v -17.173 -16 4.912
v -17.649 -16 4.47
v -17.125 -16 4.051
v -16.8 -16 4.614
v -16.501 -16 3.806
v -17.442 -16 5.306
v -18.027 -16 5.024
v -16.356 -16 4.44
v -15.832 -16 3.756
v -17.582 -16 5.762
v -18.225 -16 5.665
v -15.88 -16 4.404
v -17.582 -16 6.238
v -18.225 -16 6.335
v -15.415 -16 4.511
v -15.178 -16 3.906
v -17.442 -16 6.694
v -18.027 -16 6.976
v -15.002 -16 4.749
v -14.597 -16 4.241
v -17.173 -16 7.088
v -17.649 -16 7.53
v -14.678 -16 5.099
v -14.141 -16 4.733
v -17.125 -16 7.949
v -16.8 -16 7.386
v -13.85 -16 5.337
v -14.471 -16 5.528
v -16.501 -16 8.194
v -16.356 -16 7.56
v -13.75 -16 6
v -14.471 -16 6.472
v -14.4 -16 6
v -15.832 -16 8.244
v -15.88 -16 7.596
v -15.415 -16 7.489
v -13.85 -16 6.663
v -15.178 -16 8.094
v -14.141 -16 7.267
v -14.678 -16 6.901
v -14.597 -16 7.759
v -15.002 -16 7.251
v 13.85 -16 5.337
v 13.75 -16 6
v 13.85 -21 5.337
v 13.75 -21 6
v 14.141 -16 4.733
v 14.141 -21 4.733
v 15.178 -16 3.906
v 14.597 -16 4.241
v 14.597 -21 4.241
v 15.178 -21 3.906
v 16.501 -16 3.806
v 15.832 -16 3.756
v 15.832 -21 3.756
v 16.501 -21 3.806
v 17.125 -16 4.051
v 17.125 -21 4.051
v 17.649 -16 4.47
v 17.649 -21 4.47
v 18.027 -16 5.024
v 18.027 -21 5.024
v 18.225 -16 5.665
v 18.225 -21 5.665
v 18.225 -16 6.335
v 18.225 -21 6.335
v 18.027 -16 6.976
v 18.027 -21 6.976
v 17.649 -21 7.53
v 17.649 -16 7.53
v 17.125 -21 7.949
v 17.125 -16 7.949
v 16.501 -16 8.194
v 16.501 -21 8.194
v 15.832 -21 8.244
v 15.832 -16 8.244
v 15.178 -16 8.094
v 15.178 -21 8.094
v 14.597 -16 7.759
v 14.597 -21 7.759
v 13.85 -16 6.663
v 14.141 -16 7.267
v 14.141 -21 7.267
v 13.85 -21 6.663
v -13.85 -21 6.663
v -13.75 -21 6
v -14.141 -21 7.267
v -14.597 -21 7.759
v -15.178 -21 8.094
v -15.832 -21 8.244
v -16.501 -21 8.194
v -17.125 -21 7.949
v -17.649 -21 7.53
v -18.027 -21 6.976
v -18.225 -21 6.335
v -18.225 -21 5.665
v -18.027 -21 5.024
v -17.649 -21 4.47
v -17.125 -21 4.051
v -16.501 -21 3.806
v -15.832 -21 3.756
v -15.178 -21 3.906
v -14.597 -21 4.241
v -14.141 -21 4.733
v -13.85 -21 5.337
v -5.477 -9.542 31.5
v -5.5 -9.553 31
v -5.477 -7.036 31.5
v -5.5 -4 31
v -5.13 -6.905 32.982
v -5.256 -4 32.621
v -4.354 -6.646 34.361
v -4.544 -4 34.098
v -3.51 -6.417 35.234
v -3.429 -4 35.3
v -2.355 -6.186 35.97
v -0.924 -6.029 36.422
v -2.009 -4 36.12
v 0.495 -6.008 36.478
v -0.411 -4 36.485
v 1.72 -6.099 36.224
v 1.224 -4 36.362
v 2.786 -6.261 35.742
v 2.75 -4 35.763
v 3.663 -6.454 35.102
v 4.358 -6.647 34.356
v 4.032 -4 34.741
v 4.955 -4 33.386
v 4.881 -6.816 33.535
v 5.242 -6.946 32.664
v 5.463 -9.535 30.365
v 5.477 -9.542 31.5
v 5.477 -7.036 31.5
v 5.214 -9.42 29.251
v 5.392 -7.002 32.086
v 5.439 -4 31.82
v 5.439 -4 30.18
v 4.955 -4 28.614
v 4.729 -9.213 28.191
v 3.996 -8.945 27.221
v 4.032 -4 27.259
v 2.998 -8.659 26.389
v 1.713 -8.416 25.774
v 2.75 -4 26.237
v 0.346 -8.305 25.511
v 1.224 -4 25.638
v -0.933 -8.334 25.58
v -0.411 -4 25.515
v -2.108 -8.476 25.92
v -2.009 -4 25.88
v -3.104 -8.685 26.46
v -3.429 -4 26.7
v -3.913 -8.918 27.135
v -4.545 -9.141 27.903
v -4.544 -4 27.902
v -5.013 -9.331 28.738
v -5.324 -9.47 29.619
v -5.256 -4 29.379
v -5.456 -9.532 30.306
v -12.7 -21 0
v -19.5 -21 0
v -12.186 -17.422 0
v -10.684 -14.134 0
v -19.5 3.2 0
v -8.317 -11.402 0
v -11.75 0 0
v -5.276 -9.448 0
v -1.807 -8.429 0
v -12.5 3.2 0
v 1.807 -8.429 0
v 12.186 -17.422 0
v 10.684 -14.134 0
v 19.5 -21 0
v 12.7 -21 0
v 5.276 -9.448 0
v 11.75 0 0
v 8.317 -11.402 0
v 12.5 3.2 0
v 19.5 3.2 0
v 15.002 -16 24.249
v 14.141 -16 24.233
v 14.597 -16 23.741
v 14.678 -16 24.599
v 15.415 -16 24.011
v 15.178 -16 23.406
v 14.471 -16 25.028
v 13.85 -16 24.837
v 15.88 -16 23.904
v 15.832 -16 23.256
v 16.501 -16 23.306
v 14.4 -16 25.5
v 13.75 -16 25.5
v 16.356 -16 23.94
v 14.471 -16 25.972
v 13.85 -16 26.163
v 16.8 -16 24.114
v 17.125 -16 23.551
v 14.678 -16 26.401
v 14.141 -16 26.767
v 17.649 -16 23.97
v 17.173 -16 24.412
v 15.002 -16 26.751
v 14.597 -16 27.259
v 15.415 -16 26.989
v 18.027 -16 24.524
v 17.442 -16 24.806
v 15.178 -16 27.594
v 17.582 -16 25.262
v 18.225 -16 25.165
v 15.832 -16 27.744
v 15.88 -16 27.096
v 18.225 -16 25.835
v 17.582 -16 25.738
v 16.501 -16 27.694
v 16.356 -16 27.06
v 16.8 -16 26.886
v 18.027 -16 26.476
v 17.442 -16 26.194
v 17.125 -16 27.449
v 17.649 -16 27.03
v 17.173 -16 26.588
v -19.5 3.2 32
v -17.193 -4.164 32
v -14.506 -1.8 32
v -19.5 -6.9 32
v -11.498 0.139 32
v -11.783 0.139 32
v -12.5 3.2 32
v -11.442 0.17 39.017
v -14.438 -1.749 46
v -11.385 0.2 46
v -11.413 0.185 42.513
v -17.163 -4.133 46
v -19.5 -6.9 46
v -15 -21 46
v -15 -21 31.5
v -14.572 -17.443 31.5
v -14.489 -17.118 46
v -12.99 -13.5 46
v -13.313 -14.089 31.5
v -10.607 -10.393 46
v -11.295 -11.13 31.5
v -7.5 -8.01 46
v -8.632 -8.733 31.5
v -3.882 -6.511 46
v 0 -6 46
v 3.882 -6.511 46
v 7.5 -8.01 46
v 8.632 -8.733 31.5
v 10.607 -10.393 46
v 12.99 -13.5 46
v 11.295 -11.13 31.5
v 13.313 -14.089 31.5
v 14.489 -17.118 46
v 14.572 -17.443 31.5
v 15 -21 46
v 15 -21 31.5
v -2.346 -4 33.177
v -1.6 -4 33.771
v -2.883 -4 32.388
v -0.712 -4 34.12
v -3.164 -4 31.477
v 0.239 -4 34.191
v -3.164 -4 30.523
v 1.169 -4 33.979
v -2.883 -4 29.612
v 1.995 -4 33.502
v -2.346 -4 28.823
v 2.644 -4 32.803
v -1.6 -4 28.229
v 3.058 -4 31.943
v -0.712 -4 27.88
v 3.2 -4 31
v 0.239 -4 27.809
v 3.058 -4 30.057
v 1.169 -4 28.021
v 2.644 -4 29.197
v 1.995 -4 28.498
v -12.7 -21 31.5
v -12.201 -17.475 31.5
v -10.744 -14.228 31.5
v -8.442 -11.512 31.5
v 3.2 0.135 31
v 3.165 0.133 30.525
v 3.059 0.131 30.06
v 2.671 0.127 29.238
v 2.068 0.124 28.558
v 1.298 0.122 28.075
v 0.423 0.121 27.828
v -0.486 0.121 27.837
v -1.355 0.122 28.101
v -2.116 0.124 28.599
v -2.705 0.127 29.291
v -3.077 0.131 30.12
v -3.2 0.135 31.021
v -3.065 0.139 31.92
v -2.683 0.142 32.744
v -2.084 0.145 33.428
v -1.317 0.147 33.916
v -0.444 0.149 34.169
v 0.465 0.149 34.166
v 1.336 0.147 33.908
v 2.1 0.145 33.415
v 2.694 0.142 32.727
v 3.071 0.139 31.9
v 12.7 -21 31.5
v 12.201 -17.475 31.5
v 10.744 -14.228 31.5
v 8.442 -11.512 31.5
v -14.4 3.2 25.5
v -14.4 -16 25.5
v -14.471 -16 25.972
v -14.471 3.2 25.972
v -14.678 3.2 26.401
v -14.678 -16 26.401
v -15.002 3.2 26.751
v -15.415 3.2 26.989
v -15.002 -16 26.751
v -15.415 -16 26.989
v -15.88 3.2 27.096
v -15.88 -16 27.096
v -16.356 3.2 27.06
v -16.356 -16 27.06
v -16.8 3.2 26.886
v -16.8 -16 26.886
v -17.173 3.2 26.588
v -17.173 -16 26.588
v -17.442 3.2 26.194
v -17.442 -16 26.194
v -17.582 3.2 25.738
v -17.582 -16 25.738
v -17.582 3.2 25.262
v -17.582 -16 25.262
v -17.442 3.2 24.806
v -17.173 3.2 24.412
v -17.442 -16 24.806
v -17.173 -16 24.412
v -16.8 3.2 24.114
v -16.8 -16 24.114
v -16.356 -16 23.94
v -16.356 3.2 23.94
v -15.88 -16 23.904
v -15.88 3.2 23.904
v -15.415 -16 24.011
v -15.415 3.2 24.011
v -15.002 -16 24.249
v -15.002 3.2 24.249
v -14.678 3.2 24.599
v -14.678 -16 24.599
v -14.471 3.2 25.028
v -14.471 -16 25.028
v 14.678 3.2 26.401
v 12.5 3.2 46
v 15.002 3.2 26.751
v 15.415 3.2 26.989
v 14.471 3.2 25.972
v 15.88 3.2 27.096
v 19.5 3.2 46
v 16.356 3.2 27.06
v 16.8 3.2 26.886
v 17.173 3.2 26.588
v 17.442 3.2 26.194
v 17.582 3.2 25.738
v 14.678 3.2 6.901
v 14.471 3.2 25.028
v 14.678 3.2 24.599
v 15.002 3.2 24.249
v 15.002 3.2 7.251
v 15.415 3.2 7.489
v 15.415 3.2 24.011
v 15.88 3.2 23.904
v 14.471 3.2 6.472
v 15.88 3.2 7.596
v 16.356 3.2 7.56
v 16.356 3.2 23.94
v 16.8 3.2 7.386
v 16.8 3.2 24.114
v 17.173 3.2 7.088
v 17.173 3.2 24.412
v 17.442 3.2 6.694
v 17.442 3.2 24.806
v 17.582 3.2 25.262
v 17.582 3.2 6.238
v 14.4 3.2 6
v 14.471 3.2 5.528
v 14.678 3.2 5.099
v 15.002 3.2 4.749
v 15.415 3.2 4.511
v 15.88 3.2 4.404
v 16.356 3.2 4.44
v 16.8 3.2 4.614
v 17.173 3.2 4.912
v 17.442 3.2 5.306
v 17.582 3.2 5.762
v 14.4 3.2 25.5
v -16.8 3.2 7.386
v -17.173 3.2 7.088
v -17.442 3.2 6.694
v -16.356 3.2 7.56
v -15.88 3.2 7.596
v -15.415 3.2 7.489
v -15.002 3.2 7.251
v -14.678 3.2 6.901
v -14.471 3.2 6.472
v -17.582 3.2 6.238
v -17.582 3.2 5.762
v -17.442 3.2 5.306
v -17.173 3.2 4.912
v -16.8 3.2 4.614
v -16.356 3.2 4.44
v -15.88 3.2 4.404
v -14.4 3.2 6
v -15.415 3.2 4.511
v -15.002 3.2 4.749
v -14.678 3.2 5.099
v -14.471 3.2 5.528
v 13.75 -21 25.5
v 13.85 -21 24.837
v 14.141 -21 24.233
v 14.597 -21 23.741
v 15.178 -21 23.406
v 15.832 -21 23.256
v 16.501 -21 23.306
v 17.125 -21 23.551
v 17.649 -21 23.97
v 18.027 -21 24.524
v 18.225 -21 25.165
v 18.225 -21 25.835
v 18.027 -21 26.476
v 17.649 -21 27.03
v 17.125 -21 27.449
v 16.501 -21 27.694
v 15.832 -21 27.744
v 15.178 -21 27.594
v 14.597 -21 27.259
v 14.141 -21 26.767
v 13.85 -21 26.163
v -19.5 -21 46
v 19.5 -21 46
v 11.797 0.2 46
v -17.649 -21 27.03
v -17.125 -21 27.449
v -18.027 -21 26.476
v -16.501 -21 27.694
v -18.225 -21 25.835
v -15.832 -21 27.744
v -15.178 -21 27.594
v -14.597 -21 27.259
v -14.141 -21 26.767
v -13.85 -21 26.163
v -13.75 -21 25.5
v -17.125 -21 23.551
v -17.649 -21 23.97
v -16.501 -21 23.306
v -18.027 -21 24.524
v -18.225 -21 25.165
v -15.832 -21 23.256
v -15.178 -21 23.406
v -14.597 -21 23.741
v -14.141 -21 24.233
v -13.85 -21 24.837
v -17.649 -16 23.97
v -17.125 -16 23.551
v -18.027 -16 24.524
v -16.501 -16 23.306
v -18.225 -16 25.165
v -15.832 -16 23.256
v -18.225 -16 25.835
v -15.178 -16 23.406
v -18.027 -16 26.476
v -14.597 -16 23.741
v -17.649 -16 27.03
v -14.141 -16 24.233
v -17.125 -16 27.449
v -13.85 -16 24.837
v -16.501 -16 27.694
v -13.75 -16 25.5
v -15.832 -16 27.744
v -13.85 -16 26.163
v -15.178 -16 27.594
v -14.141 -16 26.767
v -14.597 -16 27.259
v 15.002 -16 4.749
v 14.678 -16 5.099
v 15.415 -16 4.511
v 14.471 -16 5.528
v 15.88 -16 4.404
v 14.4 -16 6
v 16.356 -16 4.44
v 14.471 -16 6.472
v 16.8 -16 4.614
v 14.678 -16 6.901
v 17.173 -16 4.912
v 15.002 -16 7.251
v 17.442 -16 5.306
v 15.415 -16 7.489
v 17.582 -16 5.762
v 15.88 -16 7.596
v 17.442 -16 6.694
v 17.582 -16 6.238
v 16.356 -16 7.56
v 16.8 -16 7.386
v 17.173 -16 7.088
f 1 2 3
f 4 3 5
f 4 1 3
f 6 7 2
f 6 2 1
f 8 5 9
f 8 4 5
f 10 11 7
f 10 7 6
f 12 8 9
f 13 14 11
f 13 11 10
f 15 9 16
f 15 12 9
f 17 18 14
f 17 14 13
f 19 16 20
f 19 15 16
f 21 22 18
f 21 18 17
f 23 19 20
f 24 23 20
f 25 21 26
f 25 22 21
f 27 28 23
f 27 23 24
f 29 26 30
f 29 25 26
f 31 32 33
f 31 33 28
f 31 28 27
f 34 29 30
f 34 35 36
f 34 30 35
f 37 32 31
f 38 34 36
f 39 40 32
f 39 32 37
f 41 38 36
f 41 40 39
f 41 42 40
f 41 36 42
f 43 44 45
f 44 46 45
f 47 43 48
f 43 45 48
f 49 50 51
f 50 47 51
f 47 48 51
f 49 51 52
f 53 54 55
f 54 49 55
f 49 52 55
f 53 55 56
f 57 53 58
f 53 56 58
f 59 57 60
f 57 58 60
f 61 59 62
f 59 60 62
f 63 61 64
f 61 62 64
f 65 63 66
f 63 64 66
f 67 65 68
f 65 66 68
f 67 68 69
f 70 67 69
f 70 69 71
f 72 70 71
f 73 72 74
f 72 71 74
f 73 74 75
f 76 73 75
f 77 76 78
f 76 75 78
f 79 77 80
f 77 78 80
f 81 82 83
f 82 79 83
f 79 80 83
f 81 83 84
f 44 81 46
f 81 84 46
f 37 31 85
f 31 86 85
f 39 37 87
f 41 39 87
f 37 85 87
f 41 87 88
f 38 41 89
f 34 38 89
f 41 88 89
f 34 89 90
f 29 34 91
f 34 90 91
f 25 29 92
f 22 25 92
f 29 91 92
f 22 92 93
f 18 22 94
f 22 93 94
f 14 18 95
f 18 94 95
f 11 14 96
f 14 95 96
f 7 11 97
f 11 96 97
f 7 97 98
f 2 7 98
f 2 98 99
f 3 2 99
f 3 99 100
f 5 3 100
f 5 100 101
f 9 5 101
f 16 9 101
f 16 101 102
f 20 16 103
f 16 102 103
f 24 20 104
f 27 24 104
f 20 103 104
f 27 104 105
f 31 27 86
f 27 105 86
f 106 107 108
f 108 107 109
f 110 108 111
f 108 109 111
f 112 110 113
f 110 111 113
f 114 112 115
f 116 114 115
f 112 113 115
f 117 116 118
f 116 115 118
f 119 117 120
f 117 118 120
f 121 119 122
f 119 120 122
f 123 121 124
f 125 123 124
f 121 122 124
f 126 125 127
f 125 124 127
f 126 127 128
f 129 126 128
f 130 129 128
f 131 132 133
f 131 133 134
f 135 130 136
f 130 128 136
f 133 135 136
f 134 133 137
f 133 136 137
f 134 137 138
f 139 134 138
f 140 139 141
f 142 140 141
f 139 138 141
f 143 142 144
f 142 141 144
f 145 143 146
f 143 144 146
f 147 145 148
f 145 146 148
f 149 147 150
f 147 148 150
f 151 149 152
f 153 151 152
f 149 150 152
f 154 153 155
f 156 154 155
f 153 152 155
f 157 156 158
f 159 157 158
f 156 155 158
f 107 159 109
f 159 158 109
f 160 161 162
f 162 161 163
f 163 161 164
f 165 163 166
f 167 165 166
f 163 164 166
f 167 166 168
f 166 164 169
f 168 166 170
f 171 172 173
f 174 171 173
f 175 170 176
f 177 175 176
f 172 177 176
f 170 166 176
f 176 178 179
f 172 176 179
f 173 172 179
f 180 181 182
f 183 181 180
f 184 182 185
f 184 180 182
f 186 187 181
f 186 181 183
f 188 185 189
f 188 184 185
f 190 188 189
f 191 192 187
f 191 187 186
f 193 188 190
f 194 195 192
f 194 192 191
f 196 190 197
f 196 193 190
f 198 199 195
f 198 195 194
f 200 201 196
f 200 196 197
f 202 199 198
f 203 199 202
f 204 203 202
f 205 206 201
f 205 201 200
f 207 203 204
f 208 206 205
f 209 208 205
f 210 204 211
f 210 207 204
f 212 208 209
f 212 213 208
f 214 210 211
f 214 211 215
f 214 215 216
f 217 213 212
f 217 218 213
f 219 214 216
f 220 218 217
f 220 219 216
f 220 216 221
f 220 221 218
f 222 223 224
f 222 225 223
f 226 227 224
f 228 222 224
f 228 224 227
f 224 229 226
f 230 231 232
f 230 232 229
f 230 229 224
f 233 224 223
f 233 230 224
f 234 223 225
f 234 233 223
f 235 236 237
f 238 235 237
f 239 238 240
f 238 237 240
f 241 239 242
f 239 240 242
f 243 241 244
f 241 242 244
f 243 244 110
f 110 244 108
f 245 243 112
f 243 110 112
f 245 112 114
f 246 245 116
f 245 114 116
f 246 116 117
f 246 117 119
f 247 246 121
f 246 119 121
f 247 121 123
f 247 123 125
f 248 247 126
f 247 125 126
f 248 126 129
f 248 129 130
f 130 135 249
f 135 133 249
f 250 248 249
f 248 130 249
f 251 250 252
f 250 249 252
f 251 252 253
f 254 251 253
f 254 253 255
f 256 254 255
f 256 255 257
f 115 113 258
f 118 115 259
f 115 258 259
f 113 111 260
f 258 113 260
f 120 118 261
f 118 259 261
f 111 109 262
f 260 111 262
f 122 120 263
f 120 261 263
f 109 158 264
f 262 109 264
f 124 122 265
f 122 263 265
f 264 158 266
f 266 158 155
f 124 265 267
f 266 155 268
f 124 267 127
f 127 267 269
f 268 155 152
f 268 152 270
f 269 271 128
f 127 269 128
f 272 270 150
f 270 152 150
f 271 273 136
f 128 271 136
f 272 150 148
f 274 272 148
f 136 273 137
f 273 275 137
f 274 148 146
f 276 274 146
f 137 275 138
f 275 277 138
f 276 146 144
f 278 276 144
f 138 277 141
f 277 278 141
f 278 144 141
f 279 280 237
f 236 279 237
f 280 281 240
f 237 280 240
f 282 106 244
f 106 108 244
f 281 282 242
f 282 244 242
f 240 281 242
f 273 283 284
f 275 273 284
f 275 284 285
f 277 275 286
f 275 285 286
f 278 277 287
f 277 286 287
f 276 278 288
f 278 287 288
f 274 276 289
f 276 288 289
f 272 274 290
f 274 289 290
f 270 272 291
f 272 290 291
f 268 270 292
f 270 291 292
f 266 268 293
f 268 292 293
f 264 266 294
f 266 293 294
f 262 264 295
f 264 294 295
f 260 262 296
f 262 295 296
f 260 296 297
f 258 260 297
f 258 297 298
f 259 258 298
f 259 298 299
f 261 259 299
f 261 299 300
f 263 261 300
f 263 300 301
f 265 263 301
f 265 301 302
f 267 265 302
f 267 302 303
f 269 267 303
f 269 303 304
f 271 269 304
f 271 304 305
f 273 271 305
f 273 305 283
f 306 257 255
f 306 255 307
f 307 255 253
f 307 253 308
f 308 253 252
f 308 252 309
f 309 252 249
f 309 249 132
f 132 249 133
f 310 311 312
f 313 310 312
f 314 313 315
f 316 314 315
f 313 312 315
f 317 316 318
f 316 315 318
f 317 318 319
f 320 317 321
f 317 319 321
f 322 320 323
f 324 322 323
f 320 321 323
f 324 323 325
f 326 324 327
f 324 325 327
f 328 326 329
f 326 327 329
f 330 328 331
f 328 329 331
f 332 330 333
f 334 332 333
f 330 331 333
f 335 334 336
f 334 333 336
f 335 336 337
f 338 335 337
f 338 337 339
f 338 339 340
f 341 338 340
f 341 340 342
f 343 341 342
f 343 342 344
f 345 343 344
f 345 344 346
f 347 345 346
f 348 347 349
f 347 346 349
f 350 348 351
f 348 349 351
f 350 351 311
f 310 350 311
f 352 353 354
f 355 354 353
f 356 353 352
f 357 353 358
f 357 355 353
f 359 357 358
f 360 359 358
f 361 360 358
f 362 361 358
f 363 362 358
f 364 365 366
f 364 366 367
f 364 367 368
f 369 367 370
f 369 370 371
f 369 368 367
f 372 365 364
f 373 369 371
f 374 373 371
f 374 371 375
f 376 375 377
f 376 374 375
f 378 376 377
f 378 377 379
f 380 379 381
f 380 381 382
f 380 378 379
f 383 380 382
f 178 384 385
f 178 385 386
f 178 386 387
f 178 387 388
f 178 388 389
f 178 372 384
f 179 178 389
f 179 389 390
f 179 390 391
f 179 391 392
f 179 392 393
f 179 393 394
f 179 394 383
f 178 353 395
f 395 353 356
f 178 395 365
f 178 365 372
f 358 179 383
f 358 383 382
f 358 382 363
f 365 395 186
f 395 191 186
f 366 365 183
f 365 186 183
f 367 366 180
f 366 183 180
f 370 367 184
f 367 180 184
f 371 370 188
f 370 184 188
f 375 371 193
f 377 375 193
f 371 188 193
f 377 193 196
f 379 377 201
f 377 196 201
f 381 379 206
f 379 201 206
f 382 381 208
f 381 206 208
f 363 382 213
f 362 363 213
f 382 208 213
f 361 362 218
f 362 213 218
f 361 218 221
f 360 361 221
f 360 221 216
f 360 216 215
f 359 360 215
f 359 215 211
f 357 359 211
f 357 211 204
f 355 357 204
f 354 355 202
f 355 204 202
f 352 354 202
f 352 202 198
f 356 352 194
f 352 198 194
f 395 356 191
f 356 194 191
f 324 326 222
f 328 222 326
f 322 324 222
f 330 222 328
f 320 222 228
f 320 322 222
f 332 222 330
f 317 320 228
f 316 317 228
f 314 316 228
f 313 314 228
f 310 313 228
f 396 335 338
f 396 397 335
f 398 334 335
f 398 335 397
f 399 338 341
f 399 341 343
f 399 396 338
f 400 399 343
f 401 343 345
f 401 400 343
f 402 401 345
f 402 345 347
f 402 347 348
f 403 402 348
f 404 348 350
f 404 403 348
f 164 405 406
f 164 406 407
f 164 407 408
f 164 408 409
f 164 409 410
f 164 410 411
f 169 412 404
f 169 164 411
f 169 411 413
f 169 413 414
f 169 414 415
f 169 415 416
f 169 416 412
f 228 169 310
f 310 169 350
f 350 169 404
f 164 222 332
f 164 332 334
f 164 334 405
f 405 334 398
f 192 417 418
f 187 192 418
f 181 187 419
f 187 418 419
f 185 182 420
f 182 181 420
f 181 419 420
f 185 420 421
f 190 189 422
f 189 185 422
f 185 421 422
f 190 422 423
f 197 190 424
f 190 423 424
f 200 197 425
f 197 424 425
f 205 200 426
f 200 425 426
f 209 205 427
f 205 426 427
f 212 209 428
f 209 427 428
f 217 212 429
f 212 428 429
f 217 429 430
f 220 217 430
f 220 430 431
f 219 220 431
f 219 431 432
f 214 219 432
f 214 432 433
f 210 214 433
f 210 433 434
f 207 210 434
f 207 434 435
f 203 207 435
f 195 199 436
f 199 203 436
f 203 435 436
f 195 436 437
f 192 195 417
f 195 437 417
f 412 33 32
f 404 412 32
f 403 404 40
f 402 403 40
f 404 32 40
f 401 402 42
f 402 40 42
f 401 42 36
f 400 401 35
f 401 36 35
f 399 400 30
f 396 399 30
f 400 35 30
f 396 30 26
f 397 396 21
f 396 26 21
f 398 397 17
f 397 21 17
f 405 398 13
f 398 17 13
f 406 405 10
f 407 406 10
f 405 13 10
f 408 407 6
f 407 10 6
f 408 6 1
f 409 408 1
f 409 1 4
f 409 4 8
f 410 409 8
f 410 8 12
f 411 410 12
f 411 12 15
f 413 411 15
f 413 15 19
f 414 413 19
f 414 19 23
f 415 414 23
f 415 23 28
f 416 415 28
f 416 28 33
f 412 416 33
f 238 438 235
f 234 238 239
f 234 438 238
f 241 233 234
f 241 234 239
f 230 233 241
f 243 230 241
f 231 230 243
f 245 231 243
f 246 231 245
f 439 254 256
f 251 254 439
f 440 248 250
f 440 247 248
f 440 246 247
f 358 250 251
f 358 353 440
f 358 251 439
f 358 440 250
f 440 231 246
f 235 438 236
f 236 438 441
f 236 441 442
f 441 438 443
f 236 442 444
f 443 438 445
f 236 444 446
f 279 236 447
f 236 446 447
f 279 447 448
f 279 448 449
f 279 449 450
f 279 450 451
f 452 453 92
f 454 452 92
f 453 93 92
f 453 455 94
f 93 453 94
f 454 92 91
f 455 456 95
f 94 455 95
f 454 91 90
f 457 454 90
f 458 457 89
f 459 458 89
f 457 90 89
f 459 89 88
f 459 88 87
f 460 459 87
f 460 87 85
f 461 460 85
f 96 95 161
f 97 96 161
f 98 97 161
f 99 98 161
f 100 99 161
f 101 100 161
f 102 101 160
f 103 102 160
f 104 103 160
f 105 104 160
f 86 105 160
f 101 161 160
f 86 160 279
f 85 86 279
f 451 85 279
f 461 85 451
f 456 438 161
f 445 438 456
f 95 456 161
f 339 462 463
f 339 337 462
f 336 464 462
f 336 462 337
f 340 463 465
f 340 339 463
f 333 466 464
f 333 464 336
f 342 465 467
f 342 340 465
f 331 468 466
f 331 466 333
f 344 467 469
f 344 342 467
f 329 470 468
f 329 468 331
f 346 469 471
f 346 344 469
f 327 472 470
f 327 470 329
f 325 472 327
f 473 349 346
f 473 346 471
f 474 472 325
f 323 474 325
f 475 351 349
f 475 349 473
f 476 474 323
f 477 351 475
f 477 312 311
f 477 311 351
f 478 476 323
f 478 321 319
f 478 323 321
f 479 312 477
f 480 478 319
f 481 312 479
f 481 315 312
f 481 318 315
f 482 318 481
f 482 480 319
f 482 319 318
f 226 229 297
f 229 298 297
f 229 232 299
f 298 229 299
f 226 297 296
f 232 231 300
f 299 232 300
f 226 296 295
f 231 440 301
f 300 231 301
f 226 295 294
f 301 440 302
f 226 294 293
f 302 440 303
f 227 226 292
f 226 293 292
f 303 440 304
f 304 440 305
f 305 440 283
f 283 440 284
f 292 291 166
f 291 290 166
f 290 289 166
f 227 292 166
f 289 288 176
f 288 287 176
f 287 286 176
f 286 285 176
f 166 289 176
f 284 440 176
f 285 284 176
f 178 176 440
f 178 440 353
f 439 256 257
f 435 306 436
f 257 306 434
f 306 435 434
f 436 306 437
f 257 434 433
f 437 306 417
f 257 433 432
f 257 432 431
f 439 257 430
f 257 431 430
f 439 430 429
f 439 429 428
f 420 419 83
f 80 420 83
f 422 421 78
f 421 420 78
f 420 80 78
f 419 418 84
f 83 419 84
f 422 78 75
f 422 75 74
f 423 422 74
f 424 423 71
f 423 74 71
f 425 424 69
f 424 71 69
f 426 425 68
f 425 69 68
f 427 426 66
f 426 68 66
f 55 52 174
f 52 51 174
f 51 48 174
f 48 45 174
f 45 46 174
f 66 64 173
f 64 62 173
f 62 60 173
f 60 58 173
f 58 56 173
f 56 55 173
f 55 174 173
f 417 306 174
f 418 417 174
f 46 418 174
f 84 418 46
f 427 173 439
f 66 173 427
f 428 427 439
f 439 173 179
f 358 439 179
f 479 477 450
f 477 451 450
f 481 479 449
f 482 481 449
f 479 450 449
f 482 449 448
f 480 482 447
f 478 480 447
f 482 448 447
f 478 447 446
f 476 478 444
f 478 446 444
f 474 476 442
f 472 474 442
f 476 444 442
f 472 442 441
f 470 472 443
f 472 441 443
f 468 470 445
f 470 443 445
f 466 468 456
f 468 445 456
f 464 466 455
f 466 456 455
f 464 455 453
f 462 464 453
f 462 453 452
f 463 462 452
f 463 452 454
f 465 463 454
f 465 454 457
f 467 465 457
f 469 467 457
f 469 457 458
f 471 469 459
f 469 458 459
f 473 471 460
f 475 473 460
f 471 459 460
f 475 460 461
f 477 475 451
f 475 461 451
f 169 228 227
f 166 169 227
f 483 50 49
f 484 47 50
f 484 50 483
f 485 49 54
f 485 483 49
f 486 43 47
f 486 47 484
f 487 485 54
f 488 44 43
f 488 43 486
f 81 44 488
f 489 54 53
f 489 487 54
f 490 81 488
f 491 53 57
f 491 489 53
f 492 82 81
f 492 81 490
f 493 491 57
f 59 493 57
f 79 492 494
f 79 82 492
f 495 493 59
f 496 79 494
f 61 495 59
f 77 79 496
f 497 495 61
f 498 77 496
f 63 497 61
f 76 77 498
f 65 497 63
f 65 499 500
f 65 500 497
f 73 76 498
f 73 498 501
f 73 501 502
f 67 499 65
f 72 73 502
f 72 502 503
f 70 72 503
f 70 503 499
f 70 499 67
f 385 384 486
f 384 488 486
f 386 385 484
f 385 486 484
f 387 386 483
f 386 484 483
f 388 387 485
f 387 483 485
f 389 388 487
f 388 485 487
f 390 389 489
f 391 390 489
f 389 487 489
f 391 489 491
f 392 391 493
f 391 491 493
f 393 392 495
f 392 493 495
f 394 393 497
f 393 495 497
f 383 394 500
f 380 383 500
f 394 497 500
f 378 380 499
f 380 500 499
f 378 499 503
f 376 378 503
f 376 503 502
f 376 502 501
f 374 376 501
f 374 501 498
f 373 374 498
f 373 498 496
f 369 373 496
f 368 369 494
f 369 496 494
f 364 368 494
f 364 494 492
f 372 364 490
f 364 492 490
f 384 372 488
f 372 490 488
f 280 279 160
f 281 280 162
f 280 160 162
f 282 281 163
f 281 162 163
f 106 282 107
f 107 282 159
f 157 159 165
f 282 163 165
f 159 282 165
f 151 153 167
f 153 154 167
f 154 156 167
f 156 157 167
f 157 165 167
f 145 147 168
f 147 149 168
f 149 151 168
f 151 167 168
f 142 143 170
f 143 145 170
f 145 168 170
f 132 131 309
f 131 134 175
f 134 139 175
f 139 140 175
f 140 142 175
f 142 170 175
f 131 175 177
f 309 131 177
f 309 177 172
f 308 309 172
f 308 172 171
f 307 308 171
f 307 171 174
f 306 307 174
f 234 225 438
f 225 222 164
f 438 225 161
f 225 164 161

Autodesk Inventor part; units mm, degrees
ref_plane "YZ Plane" through (0, 0, 0) normal (1, 0, 0) x (0, 1, 0)
ref_plane "XZ Plane" through (0, 0, 0) normal (0, 1, 0) x (-1, 0, 0)
ref_plane "XY Plane" through (0, 0, 0) normal (0, 0, 1) x (1, 0, 0)
sketch "スケッチ1" plane through (0, 0, 0) normal (0, 0, 1) x (1, 0, 0)
  line L0 (-12.5, 3.2) -> (-11.75, 0)
  line L1 (-11.75, 0) -> (11.75, 0)
  line L2 (11.75, 0) -> (12.5, 3.2)
  line L3 (12.5, 3.2) -> (19.5, 3.2)
  line L4 (19.5, 3.2) -> (19.5, -4)
  line L5 (19.5, -4) -> (-19.5, -4)
  line L6 (-19.5, -4) -> (-19.5, 3.2)
  line L7 (-19.5, 3.2) -> (-12.5, 3.2)
  circle A0 centre (0, -21) radius 12.7 construction
  line L8 (-5.5, -4) -> (5.5, -4) construction
  line L9 (5.5, -4) -> (5.5, -7.5) construction
  line L10 (5.5, -7.5) -> (-5.5, -7.5) construction
  line L11 (-5.5, -7.5) -> (-5.5, -4) construction
  circle A1 centre (0, -21) radius 14.7 construction
  line L12 (-19.5, -21) -> (19.5, -21) construction
  line L13 (-18.75, -24.8) -> (-13.25, -24.8) construction
  line L14 (-13.25, -24.8) -> (-13.25, -27.8) construction
  line L15 (-13.25, -27.8) -> (-18.75, -27.8) construction
  line L16 (-18.75, -27.8) -> (-18.75, -24.8) construction
  line L17 (-16, -27.8) -> (-16, -14.8) construction
  line L18 (-18.75, -14.8) -> (-13.25, -14.8) construction
  line L19 (-13.25, -14.8) -> (-13.25, -17.2) construction
  line L20 (-13.25, -17.2) -> (-18.75, -17.2) construction
  line L21 (-18.75, -17.2) -> (-18.75, -14.8) construction
  line L22 (-14.5, -14.8) -> (-14.5, -27.8) construction
  line L23 (-17.5, -14.8) -> (-17.5, -27.8) construction
  point P0 (0, 0)
  point P1 (0, 0)
  point P2 (0, -4)
  dimension "d0" = 4
  dimension "d1" = 3.2
  dimension "d2" = 23.5
  dimension "d3" = 25
  dimension "d4" = 39
  dimension "d5" = 25.4
  dimension "d6" = 3.5
  dimension "d7" = 21
  dimension "d8" = 11
  dimension "d9" = 2
  dimension "d11" = 5.5
  dimension "d12" = 3
  dimension "d13" = 5.5
  dimension "d14" = 2.4
  dimension "d15" = 10
  dimension "d16" = 1.5
  dimension "d17" = 1.5
  dimension "d18" = 3.8
  dimension "d19" = 16
extrude "押し出し1" add sketch "スケッチ1" along normal blind 46
sketch "スケッチ2" plane through (0, 0, 0) normal (0, 0, -1) x (-1, 0, 0)
  line L0 (19.5, -4) -> (-19.5, -4) projected
  circle A0 centre (0, -21) radius 12.7 projected
  line L1 (19.5, -21) -> (-19.5, -21) projected
  line L2 (-19.5, -21) -> (-19.5, -4)
  line L3 (19.5, -4) -> (19.5, -21)
  point P0 (0, 0)
  point P1 (-12.7, -21)
  point P2 (12.7, -21)
extrude "押し出し2" add sketch "スケッチ2" against normal blind 31.5 contours L3 L1 A0 L2 L0
sketch "スケッチ3" plane through (0, 0, 31.5) normal (0, 0, 1) x (1, 0, 0)
  line L0 (-19.5, -4) -> (19.5, -4) projected
  line L1 (-19.5, -4) -> (-19.5, -21) projected
  line L2 (-19.5, -21) -> (-12.7, -21) projected
  arc A0 (12.7, -21) -> (-12.7, -21) centre (0, -21) ccw projected
  line L3 (12.7, -21) -> (19.5, -21) projected
  line L4 (19.5, -21) -> (19.5, -4) projected
  circle A1 centre (0, -21) radius 15
  point P0 (0, 0)
  point P1 (-15, -21)
  point P2 (15, -21)
  dimension "d24" = 30
extrude "押し出し3" add sketch "スケッチ3" along normal up to surface (14.5 mm away) contours L0 L4 L3 A1 L2 L1
sketch "スケッチ5" plane through (0, 0, 0) normal (0, 1, 0) x (-1, 0, 0)
  circle A0 centre (0, 31) radius 5.5
  line L0 (-11.75, 46) -> (11.75, 46) projected
  point P0 (0, 0)
  point P1 (0, 46)
  dimension "d27" = 15
  dimension "d28" = 11
extrude "押し出し4" cut sketch "スケッチ5" along normal through all both and the other way through all
sketch "スケッチ6" plane through (-11.75, 0, 0) normal (0, 1, 0) x (1, 0, 0)
  circle A0 centre (11.75, -31) radius 5.5 projected
  circle A1 centre (11.75, -31) radius 3.2
  point P0 (11.75, 0)
  dimension "d31" = 6.4
extrude "押し出し5" add sketch "スケッチ6" against normal blind 4
sketch "スケッチ7" plane through (-19.5, -21, 0) normal (0, -1, 0) x (1, 0, 0)
  line L0 (6.8, 0) -> (0, 0) construction
  line L1 (6.8, 0) -> (6.8, 31.5) construction
  line L2 (4.5, 31.5) -> (6.8, 31.5) construction
  line L3 (4.5, 31.5) -> (4.5, 46) construction
  line L4 (4.5, 46) -> (0, 46) construction
  line L5 (0, 0) -> (0, 46) construction
  line L6 (3.5, 0) -> (3.5, 31.5) construction
  circle A0 centre (3.5, 6) radius 2.25
  circle A1 centre (3.5, 25.5) radius 2.25
  point P0 (19.5, 0)
  dimension "d34" = 16
  dimension "d35" = 4.5
  dimension "d36" = 6
  dimension "d37" = 6
extrude "押し出し6" cut sketch "スケッチ7" against normal blind 5
sketch "スケッチ8" plane through (-16, -16, 6) normal (0, -1, 0) x (1, 0, 0)
  circle A0 centre (0, 0) radius 2.25 projected
  circle A1 centre (0, 19.5) radius 2.25 projected
  circle A2 centre (0, 0) radius 1.6
  circle A3 centre (0, 19.5) radius 1.6
  point P0 (16, -6)
  dimension "d40" = 3.2
extrude "押し出し7" cut sketch "スケッチ8" against normal through all contours A2 | A3
mirror "ミラー1" about plane through (0, 0, 0) normal (1, 0, 0) of "押し出し7", "押し出し6"
sketch "スケッチ9" plane through (-11.75, 0, 0) normal (0, 1, 0) x (1, 0, 0)
  line L0 (-7.75, -46) -> (3.9203, -46)
  line L1 (3.9203, -46) -> (3.9203, -32)
  line L2 (3.9203, -32) -> (-7.75, -32)
  line L3 (-7.75, -32) -> (-7.75, -46)
  point P0 (11.75, 0)
  dimension "d43" = 14
extrude "押し出し8" cut sketch "スケッチ9" along normal blind 10
sketch "スケッチ10" plane through (0, 0, 0) normal (1, 0, 0) x (0, 1, 0)
  line L0 (0, 0) -> (0, 46) projected
  line L1 (3.2, 46) -> (-21, 46) projected
  line L2 (3.2, 0) -> (-21, 0) projected
  line L3 (0, 0) -> (0.2, 46)
  dimension "d46" = 0.2
extrude "押し出し9" add sketch "スケッチ10" along normal up to surface surface through (12.5, 3.2, 0) normal (-0.9736163, 0.2281913, 0)
mirror "ミラー2" about plane through (0, 0, 0) normal (1, 0, 0) of "押し出し9"
sketch "スケッチ11" plane through (0, -4, 31) normal (0, -1, 0) x (1, 0, 0)
  circle A0 centre (0, 0) radius 3.2 projected
  point P0 (0, -31)
extrude "押し出し10" cut sketch "スケッチ11" against normal through all
sketch "スケッチ12" plane through (0, 0, 46) normal (0, 0, 1) x (1, 0, 0)
  arc A0 (15, -21) -> (-15, -21) centre (0, -21) ccw projected
  arc A1 (-11.3852, 0.2) -> (-19.5, -6.8999) centre (0, -21) ccw
  line L0 (-19.5, 0) -> (-19.5, -21) projected
  line L1 (-19.5, 0) -> (-19.5, 3.2) projected
  line L2 (-19.5, 3.2) -> (-12.5, 3.2) projected
  line L3 (-12.5, 3.2) -> (-11.7826, 0.1391) projected
  line L4 (11.7969, 0.2) -> (-11.7969, 0.2) projected
  point P0 (0, 0)
  point P1 (-11.75, 0)
extrude "押し出し11" cut sketch "スケッチ12" against normal up to surface (14 mm away)
equation "\"d17\" = d16"
equation "\"d32\" = d0"
equation "\"d34\" = d19"
properties part number "led_holder_01"
